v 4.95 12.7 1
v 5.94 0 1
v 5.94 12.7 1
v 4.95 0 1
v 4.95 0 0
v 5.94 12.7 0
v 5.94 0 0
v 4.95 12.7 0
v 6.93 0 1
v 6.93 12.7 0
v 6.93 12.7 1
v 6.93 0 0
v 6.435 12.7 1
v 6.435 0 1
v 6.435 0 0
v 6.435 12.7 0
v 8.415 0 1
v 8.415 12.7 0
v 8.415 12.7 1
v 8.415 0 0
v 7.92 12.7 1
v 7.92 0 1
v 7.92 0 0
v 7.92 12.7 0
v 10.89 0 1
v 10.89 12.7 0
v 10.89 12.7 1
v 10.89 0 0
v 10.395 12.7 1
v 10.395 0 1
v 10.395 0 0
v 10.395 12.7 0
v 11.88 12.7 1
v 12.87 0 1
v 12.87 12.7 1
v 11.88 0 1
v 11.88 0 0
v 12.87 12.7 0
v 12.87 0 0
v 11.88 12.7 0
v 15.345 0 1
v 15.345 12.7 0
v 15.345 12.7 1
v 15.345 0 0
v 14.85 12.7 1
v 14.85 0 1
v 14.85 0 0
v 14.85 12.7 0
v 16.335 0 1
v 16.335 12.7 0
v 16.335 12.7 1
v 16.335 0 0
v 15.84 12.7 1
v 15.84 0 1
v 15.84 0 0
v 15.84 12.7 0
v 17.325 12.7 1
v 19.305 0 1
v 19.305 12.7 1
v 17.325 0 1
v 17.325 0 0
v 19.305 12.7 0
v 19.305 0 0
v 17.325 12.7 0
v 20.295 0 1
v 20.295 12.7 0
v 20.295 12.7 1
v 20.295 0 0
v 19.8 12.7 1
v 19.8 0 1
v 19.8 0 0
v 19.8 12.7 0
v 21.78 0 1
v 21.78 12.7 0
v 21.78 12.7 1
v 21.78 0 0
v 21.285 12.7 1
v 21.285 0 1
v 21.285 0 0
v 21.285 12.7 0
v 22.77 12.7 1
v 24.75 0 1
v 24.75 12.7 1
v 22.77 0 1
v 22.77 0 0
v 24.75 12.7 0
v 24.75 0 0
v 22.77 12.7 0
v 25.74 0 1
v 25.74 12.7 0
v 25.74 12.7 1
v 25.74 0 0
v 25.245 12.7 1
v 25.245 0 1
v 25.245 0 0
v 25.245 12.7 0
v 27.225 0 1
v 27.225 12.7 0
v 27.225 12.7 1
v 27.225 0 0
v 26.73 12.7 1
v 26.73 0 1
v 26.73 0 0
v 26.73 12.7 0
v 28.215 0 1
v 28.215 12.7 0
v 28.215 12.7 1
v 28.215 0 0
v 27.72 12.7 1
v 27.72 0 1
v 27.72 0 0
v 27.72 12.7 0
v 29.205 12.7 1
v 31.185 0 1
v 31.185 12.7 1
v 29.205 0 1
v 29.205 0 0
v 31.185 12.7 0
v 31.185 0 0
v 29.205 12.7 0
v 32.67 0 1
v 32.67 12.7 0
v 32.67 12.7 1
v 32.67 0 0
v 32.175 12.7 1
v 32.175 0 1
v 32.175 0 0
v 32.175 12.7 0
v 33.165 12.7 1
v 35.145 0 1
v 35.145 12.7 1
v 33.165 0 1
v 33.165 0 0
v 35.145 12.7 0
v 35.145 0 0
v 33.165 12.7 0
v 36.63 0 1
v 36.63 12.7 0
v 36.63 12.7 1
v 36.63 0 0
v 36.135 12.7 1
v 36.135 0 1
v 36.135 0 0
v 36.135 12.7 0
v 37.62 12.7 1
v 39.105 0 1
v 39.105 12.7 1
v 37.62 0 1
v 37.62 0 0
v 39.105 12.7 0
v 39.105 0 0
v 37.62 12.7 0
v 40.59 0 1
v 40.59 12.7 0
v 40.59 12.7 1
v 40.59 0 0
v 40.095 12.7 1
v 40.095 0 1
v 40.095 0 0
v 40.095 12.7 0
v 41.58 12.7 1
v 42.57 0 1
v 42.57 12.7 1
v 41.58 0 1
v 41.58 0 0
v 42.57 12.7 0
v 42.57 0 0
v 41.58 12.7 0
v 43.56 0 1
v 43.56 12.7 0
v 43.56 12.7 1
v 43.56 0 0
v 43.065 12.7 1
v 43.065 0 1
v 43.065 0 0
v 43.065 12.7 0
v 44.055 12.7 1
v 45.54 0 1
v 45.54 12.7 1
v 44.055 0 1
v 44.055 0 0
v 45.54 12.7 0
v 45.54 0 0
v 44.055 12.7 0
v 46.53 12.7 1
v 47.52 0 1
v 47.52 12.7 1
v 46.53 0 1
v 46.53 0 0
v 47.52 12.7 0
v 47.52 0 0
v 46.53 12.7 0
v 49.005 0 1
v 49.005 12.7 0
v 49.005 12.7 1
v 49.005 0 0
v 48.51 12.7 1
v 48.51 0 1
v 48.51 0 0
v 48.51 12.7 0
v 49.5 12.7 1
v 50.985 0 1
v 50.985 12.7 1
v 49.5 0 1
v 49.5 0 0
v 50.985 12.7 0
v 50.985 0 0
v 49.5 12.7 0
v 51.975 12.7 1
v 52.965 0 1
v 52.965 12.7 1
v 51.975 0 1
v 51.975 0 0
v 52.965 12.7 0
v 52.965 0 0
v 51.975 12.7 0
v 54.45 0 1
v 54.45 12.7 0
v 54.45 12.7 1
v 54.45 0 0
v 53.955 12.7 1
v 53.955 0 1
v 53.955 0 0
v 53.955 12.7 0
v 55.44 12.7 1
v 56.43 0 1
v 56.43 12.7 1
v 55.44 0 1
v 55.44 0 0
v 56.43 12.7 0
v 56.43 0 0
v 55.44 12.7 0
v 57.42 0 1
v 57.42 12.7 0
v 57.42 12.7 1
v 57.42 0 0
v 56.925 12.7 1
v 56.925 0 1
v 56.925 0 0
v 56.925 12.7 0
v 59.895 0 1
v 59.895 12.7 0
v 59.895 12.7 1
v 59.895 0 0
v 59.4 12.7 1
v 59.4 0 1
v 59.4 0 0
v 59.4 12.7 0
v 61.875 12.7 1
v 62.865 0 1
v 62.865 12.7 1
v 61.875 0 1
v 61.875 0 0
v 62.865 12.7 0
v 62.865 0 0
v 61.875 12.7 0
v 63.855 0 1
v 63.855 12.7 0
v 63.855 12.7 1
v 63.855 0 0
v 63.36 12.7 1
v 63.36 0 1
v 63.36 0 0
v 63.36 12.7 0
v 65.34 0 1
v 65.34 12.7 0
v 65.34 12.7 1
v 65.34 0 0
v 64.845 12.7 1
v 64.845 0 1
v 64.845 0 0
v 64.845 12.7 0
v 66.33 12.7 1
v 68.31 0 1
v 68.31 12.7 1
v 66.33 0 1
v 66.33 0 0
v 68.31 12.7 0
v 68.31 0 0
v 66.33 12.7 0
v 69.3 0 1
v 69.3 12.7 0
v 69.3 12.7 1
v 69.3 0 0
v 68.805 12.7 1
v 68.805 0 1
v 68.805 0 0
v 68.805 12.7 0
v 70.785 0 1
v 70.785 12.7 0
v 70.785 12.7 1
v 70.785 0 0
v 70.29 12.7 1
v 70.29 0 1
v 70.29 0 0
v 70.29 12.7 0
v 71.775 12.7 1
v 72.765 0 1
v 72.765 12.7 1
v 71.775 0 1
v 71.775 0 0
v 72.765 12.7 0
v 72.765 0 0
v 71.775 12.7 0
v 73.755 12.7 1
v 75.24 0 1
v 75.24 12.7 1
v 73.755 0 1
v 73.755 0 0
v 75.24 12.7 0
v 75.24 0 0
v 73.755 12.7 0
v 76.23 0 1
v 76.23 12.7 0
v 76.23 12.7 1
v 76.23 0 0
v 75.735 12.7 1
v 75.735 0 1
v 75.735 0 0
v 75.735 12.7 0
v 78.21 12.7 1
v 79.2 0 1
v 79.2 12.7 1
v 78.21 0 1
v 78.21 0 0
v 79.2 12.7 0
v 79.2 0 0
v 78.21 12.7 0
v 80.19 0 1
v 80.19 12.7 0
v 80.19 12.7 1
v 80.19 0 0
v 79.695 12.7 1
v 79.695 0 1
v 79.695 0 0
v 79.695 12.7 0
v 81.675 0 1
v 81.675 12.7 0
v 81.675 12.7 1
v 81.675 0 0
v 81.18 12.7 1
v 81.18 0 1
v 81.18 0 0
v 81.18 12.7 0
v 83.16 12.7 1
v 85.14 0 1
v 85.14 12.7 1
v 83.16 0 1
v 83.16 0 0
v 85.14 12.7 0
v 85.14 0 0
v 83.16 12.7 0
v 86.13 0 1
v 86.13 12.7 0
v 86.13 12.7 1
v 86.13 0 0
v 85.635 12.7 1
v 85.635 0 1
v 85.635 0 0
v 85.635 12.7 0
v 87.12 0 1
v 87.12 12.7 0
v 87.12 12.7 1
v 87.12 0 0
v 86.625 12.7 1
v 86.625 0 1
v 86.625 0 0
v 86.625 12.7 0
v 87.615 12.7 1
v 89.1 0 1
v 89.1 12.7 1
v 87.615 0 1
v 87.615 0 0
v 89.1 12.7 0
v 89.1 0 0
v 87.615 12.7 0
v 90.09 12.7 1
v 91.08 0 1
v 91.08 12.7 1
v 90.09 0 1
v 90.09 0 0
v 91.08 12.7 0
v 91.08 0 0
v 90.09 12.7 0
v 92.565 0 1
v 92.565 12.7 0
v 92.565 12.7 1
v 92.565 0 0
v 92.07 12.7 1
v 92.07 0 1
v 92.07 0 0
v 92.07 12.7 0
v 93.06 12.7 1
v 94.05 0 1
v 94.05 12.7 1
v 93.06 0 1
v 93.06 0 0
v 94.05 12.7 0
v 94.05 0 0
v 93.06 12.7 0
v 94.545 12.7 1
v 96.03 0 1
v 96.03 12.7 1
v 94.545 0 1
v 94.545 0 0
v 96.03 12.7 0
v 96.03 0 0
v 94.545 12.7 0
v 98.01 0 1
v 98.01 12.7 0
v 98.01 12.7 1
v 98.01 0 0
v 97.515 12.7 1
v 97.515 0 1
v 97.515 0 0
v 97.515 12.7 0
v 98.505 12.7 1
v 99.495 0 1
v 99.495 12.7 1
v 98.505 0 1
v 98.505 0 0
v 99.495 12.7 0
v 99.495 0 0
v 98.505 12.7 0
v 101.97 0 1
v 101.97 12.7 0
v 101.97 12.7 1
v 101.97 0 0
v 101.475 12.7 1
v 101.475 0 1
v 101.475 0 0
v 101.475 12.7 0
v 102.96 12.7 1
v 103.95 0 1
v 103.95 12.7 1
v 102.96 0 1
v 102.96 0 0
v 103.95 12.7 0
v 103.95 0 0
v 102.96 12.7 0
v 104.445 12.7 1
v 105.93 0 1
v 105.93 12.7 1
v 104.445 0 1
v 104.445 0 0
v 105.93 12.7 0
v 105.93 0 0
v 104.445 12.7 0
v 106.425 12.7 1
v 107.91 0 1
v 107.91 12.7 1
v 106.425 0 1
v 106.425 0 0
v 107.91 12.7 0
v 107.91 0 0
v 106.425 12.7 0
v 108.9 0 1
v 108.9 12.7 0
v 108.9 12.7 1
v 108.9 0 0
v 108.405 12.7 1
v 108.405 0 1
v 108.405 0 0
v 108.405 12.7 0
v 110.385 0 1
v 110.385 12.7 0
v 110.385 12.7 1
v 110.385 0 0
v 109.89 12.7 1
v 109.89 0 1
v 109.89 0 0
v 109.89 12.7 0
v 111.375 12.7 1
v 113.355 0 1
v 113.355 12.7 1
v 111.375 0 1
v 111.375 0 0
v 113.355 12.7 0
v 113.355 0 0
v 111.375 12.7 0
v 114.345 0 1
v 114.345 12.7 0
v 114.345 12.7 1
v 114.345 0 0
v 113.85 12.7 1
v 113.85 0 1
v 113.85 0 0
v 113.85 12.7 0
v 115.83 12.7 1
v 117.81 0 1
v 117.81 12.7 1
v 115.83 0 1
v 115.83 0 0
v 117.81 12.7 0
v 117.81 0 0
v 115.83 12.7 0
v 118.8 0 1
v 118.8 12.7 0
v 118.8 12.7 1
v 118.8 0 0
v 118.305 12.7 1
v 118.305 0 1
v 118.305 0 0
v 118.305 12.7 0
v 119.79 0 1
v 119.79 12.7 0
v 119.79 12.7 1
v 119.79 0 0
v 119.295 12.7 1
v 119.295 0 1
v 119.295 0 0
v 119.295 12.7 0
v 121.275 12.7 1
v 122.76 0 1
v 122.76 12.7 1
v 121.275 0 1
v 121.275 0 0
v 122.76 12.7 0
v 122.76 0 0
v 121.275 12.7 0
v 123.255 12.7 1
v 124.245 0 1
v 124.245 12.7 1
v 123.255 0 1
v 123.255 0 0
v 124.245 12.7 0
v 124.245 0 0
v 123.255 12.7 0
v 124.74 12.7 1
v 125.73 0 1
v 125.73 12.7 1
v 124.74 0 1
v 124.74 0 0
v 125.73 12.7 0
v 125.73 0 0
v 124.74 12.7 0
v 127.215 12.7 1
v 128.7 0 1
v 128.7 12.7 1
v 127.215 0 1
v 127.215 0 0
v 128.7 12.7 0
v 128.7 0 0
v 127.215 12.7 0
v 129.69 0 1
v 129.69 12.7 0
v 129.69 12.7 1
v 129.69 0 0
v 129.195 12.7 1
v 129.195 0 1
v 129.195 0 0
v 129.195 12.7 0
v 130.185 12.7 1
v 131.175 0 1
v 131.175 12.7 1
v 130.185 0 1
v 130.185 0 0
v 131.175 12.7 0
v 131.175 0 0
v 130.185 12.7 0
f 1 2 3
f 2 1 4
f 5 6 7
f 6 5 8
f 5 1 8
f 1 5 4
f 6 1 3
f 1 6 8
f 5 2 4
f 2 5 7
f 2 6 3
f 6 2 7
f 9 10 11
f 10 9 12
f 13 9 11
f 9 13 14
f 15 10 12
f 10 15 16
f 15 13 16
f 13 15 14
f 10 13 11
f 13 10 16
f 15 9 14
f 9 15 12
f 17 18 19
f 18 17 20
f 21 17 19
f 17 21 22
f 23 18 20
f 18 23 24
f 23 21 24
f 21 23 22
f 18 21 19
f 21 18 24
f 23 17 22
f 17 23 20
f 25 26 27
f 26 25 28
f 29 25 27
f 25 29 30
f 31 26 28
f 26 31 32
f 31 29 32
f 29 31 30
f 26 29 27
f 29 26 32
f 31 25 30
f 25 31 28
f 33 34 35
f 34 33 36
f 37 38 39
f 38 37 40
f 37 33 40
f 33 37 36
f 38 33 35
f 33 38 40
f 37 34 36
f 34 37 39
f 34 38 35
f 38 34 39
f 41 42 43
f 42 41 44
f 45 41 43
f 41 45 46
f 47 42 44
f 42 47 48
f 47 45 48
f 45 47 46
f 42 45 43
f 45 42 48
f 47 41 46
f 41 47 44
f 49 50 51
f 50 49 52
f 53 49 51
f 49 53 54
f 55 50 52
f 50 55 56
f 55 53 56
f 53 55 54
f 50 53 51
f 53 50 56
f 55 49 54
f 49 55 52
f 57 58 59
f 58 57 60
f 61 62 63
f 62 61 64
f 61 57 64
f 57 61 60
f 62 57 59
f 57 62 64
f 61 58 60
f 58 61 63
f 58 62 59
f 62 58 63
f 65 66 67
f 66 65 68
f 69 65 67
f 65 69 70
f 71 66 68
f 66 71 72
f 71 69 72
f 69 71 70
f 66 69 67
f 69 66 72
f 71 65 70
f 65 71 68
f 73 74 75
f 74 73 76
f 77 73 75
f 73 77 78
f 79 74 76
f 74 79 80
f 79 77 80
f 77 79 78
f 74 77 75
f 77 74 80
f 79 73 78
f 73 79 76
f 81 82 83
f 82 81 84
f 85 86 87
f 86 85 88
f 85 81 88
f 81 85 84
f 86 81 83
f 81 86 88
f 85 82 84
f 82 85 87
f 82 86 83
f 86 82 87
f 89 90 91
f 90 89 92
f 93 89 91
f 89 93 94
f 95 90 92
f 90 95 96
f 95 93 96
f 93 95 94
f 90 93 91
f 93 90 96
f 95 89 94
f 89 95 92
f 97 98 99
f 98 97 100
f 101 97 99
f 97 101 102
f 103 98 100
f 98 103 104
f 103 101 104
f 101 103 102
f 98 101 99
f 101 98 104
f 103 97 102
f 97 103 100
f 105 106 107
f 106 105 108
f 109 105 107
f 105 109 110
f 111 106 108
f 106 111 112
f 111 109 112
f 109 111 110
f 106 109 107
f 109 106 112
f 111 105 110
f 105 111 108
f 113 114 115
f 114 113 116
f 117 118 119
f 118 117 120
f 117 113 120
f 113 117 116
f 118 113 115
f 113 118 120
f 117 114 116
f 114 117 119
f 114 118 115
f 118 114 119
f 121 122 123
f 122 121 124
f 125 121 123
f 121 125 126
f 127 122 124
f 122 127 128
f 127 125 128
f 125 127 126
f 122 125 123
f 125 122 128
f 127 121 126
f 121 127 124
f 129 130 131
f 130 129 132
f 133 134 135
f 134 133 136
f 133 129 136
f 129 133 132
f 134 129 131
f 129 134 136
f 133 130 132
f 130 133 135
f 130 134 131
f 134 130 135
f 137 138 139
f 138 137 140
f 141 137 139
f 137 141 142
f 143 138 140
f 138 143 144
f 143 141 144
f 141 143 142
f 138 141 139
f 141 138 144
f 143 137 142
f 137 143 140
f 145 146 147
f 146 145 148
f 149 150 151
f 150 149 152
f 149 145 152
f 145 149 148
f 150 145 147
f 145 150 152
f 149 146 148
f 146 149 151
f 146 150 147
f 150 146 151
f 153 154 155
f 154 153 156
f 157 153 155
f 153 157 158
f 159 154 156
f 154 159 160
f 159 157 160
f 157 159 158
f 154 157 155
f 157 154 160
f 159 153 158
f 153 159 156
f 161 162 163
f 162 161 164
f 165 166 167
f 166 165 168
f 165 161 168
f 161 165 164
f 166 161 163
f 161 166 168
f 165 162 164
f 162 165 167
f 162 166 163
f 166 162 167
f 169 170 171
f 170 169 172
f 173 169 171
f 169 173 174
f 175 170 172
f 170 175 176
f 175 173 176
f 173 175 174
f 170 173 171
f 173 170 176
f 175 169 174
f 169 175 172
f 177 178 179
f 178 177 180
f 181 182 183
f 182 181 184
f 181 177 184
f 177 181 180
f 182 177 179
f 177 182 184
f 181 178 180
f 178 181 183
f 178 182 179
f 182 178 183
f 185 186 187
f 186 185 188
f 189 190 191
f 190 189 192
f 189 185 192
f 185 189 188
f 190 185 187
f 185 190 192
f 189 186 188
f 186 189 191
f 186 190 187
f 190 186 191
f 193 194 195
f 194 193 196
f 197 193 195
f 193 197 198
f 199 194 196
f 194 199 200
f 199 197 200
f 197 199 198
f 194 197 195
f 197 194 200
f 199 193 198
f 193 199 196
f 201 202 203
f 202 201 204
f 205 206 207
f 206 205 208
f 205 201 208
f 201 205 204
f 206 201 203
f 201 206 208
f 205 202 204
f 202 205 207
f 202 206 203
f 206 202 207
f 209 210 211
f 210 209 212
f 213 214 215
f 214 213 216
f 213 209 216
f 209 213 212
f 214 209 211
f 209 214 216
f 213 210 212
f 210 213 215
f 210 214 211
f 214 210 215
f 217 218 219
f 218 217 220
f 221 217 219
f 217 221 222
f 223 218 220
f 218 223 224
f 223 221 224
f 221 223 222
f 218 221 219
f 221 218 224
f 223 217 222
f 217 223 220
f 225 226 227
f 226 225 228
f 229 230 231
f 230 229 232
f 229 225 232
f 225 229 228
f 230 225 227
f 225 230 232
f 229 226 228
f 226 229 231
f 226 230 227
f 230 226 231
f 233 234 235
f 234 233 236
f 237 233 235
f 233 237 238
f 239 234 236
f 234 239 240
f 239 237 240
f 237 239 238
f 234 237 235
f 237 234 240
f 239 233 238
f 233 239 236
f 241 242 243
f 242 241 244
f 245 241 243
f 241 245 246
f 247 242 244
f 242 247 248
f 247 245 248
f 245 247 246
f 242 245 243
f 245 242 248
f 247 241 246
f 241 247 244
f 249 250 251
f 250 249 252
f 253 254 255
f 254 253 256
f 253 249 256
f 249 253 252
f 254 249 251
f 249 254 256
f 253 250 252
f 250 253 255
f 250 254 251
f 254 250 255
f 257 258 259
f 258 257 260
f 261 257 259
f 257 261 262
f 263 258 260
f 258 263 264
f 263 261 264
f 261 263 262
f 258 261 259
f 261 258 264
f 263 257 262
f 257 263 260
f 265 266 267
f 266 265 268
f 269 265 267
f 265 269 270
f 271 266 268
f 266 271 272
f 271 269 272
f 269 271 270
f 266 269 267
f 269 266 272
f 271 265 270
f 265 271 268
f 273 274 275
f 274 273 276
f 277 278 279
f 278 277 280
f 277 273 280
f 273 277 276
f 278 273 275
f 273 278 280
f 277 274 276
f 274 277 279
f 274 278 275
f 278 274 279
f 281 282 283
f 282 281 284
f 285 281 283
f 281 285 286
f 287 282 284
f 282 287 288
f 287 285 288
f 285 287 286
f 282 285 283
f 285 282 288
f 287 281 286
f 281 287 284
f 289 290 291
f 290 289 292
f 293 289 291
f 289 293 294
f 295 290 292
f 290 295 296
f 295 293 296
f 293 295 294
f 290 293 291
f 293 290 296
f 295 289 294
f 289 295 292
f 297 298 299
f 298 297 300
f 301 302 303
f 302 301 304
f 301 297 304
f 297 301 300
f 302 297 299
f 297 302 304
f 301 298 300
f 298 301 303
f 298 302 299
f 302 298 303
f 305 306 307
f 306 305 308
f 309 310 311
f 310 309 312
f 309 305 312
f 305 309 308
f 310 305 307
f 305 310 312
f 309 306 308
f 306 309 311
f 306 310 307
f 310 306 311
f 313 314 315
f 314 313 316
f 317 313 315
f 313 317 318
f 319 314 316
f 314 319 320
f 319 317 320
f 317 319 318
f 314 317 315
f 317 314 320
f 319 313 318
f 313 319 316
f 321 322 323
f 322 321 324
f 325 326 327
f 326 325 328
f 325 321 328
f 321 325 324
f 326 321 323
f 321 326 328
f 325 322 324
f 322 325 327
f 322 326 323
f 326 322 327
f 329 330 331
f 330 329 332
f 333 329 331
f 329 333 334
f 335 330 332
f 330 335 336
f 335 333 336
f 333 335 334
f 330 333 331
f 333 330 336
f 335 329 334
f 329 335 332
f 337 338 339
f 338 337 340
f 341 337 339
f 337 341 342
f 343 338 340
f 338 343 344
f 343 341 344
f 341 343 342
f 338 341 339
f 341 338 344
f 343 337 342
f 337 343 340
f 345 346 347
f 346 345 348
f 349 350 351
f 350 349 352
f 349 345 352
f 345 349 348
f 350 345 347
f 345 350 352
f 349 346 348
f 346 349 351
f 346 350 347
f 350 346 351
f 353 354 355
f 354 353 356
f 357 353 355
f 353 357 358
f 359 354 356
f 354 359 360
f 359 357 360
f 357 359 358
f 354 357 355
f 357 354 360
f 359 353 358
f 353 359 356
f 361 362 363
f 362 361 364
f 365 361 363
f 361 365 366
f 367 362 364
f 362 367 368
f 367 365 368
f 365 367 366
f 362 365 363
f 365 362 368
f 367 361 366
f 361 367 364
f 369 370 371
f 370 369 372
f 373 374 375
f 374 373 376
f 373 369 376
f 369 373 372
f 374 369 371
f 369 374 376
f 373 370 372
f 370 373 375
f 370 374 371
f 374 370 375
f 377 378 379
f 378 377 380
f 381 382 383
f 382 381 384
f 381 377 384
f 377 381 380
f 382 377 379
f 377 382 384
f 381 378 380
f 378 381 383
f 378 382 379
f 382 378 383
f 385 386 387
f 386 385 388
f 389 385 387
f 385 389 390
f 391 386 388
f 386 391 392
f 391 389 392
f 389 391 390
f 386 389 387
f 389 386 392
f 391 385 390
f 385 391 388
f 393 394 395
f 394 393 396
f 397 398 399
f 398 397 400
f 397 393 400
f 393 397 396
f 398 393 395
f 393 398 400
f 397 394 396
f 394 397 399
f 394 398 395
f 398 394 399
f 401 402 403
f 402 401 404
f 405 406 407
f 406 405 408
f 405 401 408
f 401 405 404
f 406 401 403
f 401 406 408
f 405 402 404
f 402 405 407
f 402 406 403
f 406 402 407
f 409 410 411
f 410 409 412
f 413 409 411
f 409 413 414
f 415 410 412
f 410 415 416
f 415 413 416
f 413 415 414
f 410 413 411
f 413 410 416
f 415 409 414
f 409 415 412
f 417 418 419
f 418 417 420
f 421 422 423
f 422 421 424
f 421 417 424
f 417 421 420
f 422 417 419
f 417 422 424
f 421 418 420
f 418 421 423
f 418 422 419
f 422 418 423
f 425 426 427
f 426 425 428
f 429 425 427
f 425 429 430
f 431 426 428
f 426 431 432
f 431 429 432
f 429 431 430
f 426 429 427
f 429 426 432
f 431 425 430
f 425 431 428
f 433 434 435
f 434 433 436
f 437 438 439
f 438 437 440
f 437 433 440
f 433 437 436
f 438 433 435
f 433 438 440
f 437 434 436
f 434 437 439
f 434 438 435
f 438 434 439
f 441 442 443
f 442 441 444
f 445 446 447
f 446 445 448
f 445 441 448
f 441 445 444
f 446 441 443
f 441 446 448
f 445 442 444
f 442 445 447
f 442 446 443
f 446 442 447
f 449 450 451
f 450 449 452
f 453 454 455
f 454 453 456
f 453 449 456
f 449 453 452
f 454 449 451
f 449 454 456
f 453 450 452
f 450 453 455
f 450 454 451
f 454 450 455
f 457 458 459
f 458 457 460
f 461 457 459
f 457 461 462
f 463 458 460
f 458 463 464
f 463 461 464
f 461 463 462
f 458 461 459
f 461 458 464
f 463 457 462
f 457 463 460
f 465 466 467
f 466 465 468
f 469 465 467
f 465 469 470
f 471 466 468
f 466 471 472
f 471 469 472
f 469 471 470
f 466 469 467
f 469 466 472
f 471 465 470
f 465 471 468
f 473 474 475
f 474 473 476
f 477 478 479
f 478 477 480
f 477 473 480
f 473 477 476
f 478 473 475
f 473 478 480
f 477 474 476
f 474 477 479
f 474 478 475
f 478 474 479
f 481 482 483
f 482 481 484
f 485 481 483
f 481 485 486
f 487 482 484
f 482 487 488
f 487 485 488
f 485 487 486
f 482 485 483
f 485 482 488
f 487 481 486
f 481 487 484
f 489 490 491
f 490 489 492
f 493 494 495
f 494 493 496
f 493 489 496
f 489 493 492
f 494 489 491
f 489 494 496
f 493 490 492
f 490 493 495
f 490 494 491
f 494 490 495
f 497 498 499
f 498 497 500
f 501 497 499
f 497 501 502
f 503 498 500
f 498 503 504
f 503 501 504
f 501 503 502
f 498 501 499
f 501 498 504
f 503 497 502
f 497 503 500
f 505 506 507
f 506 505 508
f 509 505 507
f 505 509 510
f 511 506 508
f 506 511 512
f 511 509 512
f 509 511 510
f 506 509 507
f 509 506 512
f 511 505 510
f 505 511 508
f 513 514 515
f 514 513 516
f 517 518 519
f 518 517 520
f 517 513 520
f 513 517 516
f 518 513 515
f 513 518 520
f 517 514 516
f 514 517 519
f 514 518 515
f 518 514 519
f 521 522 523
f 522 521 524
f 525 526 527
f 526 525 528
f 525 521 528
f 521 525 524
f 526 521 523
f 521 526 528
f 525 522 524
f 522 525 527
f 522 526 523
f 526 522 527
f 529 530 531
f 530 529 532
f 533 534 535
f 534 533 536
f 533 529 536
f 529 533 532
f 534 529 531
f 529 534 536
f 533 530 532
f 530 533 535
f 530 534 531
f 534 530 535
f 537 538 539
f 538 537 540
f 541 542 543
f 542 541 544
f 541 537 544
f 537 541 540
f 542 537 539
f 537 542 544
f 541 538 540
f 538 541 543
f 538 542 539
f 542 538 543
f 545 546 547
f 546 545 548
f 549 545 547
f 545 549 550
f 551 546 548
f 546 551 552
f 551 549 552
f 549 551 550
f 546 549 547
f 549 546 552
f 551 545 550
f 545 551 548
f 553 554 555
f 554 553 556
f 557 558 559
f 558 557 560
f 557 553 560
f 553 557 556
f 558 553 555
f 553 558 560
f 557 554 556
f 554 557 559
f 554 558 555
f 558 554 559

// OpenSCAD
// file: util/bitmap.scad
/*****************************************************************************
 * Module Bitmap Library
 * Modules to create bitmaps of unit squares from 1 or 2 dimensional vectors.
 *****************************************************************************
 * Copyright 2017 Chris Baker
 *
 * This program is free software: you can redistribute it and/or modify
 * it under the terms of the GNU Lesser General Public License as published by
 * the Free Software Foundation, either version 3 of the License, or
 * (at your option) any later version.
 *
 * This program is distributed in the hope that it will be useful,
 * but WITHOUT ANY WARRANTY; without even the implied warranty of
 * MERCHANTABILITY or FITNESS FOR A PARTICULAR PURPOSE.  See the
 * GNU Lesser General Public License for more details.
 *
 * You should have received a copy of the GNU Lesser General Public License
 * along with this program.  If not, see <http://www.gnu.org/licenses/>.
 *****************************************************************************
 * Usage:
 * Include this file with the "use" tag.
 * Depends on compat.scad library.
 *
 * API:
 *   1dbitmap(bitmap, center, expansion, vector_mode)
 *   2dbitmap(bitmap, center, expansion, vector_mode)
 *     Generate a 1 or 2-Dimensional field of modules based on the provided
 *     bitmap vector. See Bitmap Vectors below.
 *     The center flag determines whether to center the bitmap on the origin.
 *     The expansion value actually shrinks each cube in the x and y
 *     dimension by the specified amount.
 *     The vector_mode flag determines whether to create 3D solid geometry
 *     (unit cubes) or 2D vector geometry (squares).
 *
 * Bitmap Vectors:
 *   The bitmap vectors primarily provide boolean information.
 *   A module will be placed where these vectors have a postive value and
 *   skipped where they have a negative value. I.E. 0, -1, false, and undef
 *   are all equivalent and result in a skip. 1 and true are equivalent and
 *   result in a placed 1-unit module.
 *   Further, if the value is an integer it will be treated as a height for
 *   the module, allowing z-maps to be created.
 *   If the value is not an integer or boolean, it will be treated as a color
 *   reference. This can be a string or RGBA vector that will be used to
 *   color the module in the OpenSCAD preview window.
 *   In current versions of OpenSCAD, the color has no effect in the rendered
 *   view or STL output.
 *
 * Vector Mode:
 *   Although OpenSCAD supports generating 2D geometry, there are several
 *   caveats:
 *   - 2D and 3D geometry cannot be mixed
 *   - Extruding 2D geometry causes color information to be lost
 *   - All 2D geometry is projected onto the XY plane when rendering
 *   - Rendering also results in loss of color (same as 3D)
 *   - The SVG exporter is somewhat limited:
 *     - The pixel size of the image is hard-coded in the file
 *     - The title of the image is a generic string
 *     - The color selection for stroke and fill is fixed
 *     - The stroke-width is set to a large value that will cause overlap
 *     - The background is transparent
 *     - Only one path element is created with all of the geometry; there is
 *       no easy way to split up the geometry into multiple logical units.
 *     - These issues can mostly be resolved by hand-editing the file:
 *       - Remove or modify the width and height parameters from the svg
 *         element at the top of the file to provide better scaling.
 *       - Edit the title element at the top of the file to change the title.
 *       - Edit the stroke and fill parameters of the path element (these will
 *         probably be at the end of the file).
 *       - Set the stroke-width parameter for the path element to 0.
 *****************************************************************************/
use <compat.scad>

/*
 * 2dbitmap - Turn a 2D vector into a bitmap of cubes
 *
 * bitmap - 2D vector representing where to place each cube
 *          Value can either be boolean, z-height, or color
 * center - center cubes around the origin
 * expansion - size of gap around each pixel (screendoor)
 * vector_mode - create a 2D vector drawing instead of 3D extrusion
 */
module 2dbitmap(bitmap=[[1,0],[0,1]], center=false, expansion=0, vector_mode=false)
{
	ylen=len(bitmap)-1;

	for (y=[0:ylen]) {
		xlen=len(bitmap[y])-1;
		for (x=[0:xlen])
			translate([x-(center?xlen/2:0),ylen-y-(center?ylen/2:0),0])
				if (is_indexable(bitmap[y][x]))
					color(bitmap[y][x])
						if (vector_mode)
							square([1-expansion,1-expansion], center=center);
						else
							cube([1-expansion,1-expansion,1], center=center);
				else
					if (bitmap[y][x])
						if (vector_mode)
							square([1-expansion,1-expansion], center=center);
						else
							cube([1-expansion,1-expansion,clamp_nonnum(bitmap[y][x])], center=center);
	}
}

module 1dbitmap(bitmap=[1,0,1,0,1], center=false, expansion=0, vector_mode=false)
	2dbitmap([bitmap], center, expansion, vector_mode);

/*
 * Examples
 */

// 1D with z-height
translate([10,0,0]) scale([1,10,1])
	1dbitmap(bitmap=[1,1,0,2,0,0,3], expansion=.1);

// 1D with boolean
translate([-20,0,0]) scale([1,10,1])
	1dbitmap(bitmap=[true,false,true,false,true,true]);

// 2D with z-height
scale([2,2,1])
	2dbitmap(bitmap=[[1,0,2,1],[0,3,3,0],[1,1,0,1]],
		center=true);

// 1D with color
translate([0,-10,0]) scale([1,3,1])
	1dbitmap(bitmap=["red","white","blue",[0,0.3,0,0.5]]);

// 1D with color using 2D-vector-mode
translate([-7,-8,0]) scale([1,2])
	1dbitmap(bitmap=["red",0,"blue",0,"green"], vector_mode=true);
translate([-4.5,-10,0]) scale([1,2])
	1dbitmap(bitmap=["red",0,"blue",0,"green"], vector_mode=true, center=true);
// main file
/* See API documentation in barcodes/code128.scad for more details. */
use <barcodes/code128.scad>

/* simple example */
//code_128(cs128_c([1,2,3,4]), bar="black");

/* typical example */
code_128(cs128_b("https://git.io/JfUro"), bar="black");

/* mixed-mode example */
//code_128(concat(cs128_c([1,2,3,4]), cs128_a("5ABC")), bar="black");
